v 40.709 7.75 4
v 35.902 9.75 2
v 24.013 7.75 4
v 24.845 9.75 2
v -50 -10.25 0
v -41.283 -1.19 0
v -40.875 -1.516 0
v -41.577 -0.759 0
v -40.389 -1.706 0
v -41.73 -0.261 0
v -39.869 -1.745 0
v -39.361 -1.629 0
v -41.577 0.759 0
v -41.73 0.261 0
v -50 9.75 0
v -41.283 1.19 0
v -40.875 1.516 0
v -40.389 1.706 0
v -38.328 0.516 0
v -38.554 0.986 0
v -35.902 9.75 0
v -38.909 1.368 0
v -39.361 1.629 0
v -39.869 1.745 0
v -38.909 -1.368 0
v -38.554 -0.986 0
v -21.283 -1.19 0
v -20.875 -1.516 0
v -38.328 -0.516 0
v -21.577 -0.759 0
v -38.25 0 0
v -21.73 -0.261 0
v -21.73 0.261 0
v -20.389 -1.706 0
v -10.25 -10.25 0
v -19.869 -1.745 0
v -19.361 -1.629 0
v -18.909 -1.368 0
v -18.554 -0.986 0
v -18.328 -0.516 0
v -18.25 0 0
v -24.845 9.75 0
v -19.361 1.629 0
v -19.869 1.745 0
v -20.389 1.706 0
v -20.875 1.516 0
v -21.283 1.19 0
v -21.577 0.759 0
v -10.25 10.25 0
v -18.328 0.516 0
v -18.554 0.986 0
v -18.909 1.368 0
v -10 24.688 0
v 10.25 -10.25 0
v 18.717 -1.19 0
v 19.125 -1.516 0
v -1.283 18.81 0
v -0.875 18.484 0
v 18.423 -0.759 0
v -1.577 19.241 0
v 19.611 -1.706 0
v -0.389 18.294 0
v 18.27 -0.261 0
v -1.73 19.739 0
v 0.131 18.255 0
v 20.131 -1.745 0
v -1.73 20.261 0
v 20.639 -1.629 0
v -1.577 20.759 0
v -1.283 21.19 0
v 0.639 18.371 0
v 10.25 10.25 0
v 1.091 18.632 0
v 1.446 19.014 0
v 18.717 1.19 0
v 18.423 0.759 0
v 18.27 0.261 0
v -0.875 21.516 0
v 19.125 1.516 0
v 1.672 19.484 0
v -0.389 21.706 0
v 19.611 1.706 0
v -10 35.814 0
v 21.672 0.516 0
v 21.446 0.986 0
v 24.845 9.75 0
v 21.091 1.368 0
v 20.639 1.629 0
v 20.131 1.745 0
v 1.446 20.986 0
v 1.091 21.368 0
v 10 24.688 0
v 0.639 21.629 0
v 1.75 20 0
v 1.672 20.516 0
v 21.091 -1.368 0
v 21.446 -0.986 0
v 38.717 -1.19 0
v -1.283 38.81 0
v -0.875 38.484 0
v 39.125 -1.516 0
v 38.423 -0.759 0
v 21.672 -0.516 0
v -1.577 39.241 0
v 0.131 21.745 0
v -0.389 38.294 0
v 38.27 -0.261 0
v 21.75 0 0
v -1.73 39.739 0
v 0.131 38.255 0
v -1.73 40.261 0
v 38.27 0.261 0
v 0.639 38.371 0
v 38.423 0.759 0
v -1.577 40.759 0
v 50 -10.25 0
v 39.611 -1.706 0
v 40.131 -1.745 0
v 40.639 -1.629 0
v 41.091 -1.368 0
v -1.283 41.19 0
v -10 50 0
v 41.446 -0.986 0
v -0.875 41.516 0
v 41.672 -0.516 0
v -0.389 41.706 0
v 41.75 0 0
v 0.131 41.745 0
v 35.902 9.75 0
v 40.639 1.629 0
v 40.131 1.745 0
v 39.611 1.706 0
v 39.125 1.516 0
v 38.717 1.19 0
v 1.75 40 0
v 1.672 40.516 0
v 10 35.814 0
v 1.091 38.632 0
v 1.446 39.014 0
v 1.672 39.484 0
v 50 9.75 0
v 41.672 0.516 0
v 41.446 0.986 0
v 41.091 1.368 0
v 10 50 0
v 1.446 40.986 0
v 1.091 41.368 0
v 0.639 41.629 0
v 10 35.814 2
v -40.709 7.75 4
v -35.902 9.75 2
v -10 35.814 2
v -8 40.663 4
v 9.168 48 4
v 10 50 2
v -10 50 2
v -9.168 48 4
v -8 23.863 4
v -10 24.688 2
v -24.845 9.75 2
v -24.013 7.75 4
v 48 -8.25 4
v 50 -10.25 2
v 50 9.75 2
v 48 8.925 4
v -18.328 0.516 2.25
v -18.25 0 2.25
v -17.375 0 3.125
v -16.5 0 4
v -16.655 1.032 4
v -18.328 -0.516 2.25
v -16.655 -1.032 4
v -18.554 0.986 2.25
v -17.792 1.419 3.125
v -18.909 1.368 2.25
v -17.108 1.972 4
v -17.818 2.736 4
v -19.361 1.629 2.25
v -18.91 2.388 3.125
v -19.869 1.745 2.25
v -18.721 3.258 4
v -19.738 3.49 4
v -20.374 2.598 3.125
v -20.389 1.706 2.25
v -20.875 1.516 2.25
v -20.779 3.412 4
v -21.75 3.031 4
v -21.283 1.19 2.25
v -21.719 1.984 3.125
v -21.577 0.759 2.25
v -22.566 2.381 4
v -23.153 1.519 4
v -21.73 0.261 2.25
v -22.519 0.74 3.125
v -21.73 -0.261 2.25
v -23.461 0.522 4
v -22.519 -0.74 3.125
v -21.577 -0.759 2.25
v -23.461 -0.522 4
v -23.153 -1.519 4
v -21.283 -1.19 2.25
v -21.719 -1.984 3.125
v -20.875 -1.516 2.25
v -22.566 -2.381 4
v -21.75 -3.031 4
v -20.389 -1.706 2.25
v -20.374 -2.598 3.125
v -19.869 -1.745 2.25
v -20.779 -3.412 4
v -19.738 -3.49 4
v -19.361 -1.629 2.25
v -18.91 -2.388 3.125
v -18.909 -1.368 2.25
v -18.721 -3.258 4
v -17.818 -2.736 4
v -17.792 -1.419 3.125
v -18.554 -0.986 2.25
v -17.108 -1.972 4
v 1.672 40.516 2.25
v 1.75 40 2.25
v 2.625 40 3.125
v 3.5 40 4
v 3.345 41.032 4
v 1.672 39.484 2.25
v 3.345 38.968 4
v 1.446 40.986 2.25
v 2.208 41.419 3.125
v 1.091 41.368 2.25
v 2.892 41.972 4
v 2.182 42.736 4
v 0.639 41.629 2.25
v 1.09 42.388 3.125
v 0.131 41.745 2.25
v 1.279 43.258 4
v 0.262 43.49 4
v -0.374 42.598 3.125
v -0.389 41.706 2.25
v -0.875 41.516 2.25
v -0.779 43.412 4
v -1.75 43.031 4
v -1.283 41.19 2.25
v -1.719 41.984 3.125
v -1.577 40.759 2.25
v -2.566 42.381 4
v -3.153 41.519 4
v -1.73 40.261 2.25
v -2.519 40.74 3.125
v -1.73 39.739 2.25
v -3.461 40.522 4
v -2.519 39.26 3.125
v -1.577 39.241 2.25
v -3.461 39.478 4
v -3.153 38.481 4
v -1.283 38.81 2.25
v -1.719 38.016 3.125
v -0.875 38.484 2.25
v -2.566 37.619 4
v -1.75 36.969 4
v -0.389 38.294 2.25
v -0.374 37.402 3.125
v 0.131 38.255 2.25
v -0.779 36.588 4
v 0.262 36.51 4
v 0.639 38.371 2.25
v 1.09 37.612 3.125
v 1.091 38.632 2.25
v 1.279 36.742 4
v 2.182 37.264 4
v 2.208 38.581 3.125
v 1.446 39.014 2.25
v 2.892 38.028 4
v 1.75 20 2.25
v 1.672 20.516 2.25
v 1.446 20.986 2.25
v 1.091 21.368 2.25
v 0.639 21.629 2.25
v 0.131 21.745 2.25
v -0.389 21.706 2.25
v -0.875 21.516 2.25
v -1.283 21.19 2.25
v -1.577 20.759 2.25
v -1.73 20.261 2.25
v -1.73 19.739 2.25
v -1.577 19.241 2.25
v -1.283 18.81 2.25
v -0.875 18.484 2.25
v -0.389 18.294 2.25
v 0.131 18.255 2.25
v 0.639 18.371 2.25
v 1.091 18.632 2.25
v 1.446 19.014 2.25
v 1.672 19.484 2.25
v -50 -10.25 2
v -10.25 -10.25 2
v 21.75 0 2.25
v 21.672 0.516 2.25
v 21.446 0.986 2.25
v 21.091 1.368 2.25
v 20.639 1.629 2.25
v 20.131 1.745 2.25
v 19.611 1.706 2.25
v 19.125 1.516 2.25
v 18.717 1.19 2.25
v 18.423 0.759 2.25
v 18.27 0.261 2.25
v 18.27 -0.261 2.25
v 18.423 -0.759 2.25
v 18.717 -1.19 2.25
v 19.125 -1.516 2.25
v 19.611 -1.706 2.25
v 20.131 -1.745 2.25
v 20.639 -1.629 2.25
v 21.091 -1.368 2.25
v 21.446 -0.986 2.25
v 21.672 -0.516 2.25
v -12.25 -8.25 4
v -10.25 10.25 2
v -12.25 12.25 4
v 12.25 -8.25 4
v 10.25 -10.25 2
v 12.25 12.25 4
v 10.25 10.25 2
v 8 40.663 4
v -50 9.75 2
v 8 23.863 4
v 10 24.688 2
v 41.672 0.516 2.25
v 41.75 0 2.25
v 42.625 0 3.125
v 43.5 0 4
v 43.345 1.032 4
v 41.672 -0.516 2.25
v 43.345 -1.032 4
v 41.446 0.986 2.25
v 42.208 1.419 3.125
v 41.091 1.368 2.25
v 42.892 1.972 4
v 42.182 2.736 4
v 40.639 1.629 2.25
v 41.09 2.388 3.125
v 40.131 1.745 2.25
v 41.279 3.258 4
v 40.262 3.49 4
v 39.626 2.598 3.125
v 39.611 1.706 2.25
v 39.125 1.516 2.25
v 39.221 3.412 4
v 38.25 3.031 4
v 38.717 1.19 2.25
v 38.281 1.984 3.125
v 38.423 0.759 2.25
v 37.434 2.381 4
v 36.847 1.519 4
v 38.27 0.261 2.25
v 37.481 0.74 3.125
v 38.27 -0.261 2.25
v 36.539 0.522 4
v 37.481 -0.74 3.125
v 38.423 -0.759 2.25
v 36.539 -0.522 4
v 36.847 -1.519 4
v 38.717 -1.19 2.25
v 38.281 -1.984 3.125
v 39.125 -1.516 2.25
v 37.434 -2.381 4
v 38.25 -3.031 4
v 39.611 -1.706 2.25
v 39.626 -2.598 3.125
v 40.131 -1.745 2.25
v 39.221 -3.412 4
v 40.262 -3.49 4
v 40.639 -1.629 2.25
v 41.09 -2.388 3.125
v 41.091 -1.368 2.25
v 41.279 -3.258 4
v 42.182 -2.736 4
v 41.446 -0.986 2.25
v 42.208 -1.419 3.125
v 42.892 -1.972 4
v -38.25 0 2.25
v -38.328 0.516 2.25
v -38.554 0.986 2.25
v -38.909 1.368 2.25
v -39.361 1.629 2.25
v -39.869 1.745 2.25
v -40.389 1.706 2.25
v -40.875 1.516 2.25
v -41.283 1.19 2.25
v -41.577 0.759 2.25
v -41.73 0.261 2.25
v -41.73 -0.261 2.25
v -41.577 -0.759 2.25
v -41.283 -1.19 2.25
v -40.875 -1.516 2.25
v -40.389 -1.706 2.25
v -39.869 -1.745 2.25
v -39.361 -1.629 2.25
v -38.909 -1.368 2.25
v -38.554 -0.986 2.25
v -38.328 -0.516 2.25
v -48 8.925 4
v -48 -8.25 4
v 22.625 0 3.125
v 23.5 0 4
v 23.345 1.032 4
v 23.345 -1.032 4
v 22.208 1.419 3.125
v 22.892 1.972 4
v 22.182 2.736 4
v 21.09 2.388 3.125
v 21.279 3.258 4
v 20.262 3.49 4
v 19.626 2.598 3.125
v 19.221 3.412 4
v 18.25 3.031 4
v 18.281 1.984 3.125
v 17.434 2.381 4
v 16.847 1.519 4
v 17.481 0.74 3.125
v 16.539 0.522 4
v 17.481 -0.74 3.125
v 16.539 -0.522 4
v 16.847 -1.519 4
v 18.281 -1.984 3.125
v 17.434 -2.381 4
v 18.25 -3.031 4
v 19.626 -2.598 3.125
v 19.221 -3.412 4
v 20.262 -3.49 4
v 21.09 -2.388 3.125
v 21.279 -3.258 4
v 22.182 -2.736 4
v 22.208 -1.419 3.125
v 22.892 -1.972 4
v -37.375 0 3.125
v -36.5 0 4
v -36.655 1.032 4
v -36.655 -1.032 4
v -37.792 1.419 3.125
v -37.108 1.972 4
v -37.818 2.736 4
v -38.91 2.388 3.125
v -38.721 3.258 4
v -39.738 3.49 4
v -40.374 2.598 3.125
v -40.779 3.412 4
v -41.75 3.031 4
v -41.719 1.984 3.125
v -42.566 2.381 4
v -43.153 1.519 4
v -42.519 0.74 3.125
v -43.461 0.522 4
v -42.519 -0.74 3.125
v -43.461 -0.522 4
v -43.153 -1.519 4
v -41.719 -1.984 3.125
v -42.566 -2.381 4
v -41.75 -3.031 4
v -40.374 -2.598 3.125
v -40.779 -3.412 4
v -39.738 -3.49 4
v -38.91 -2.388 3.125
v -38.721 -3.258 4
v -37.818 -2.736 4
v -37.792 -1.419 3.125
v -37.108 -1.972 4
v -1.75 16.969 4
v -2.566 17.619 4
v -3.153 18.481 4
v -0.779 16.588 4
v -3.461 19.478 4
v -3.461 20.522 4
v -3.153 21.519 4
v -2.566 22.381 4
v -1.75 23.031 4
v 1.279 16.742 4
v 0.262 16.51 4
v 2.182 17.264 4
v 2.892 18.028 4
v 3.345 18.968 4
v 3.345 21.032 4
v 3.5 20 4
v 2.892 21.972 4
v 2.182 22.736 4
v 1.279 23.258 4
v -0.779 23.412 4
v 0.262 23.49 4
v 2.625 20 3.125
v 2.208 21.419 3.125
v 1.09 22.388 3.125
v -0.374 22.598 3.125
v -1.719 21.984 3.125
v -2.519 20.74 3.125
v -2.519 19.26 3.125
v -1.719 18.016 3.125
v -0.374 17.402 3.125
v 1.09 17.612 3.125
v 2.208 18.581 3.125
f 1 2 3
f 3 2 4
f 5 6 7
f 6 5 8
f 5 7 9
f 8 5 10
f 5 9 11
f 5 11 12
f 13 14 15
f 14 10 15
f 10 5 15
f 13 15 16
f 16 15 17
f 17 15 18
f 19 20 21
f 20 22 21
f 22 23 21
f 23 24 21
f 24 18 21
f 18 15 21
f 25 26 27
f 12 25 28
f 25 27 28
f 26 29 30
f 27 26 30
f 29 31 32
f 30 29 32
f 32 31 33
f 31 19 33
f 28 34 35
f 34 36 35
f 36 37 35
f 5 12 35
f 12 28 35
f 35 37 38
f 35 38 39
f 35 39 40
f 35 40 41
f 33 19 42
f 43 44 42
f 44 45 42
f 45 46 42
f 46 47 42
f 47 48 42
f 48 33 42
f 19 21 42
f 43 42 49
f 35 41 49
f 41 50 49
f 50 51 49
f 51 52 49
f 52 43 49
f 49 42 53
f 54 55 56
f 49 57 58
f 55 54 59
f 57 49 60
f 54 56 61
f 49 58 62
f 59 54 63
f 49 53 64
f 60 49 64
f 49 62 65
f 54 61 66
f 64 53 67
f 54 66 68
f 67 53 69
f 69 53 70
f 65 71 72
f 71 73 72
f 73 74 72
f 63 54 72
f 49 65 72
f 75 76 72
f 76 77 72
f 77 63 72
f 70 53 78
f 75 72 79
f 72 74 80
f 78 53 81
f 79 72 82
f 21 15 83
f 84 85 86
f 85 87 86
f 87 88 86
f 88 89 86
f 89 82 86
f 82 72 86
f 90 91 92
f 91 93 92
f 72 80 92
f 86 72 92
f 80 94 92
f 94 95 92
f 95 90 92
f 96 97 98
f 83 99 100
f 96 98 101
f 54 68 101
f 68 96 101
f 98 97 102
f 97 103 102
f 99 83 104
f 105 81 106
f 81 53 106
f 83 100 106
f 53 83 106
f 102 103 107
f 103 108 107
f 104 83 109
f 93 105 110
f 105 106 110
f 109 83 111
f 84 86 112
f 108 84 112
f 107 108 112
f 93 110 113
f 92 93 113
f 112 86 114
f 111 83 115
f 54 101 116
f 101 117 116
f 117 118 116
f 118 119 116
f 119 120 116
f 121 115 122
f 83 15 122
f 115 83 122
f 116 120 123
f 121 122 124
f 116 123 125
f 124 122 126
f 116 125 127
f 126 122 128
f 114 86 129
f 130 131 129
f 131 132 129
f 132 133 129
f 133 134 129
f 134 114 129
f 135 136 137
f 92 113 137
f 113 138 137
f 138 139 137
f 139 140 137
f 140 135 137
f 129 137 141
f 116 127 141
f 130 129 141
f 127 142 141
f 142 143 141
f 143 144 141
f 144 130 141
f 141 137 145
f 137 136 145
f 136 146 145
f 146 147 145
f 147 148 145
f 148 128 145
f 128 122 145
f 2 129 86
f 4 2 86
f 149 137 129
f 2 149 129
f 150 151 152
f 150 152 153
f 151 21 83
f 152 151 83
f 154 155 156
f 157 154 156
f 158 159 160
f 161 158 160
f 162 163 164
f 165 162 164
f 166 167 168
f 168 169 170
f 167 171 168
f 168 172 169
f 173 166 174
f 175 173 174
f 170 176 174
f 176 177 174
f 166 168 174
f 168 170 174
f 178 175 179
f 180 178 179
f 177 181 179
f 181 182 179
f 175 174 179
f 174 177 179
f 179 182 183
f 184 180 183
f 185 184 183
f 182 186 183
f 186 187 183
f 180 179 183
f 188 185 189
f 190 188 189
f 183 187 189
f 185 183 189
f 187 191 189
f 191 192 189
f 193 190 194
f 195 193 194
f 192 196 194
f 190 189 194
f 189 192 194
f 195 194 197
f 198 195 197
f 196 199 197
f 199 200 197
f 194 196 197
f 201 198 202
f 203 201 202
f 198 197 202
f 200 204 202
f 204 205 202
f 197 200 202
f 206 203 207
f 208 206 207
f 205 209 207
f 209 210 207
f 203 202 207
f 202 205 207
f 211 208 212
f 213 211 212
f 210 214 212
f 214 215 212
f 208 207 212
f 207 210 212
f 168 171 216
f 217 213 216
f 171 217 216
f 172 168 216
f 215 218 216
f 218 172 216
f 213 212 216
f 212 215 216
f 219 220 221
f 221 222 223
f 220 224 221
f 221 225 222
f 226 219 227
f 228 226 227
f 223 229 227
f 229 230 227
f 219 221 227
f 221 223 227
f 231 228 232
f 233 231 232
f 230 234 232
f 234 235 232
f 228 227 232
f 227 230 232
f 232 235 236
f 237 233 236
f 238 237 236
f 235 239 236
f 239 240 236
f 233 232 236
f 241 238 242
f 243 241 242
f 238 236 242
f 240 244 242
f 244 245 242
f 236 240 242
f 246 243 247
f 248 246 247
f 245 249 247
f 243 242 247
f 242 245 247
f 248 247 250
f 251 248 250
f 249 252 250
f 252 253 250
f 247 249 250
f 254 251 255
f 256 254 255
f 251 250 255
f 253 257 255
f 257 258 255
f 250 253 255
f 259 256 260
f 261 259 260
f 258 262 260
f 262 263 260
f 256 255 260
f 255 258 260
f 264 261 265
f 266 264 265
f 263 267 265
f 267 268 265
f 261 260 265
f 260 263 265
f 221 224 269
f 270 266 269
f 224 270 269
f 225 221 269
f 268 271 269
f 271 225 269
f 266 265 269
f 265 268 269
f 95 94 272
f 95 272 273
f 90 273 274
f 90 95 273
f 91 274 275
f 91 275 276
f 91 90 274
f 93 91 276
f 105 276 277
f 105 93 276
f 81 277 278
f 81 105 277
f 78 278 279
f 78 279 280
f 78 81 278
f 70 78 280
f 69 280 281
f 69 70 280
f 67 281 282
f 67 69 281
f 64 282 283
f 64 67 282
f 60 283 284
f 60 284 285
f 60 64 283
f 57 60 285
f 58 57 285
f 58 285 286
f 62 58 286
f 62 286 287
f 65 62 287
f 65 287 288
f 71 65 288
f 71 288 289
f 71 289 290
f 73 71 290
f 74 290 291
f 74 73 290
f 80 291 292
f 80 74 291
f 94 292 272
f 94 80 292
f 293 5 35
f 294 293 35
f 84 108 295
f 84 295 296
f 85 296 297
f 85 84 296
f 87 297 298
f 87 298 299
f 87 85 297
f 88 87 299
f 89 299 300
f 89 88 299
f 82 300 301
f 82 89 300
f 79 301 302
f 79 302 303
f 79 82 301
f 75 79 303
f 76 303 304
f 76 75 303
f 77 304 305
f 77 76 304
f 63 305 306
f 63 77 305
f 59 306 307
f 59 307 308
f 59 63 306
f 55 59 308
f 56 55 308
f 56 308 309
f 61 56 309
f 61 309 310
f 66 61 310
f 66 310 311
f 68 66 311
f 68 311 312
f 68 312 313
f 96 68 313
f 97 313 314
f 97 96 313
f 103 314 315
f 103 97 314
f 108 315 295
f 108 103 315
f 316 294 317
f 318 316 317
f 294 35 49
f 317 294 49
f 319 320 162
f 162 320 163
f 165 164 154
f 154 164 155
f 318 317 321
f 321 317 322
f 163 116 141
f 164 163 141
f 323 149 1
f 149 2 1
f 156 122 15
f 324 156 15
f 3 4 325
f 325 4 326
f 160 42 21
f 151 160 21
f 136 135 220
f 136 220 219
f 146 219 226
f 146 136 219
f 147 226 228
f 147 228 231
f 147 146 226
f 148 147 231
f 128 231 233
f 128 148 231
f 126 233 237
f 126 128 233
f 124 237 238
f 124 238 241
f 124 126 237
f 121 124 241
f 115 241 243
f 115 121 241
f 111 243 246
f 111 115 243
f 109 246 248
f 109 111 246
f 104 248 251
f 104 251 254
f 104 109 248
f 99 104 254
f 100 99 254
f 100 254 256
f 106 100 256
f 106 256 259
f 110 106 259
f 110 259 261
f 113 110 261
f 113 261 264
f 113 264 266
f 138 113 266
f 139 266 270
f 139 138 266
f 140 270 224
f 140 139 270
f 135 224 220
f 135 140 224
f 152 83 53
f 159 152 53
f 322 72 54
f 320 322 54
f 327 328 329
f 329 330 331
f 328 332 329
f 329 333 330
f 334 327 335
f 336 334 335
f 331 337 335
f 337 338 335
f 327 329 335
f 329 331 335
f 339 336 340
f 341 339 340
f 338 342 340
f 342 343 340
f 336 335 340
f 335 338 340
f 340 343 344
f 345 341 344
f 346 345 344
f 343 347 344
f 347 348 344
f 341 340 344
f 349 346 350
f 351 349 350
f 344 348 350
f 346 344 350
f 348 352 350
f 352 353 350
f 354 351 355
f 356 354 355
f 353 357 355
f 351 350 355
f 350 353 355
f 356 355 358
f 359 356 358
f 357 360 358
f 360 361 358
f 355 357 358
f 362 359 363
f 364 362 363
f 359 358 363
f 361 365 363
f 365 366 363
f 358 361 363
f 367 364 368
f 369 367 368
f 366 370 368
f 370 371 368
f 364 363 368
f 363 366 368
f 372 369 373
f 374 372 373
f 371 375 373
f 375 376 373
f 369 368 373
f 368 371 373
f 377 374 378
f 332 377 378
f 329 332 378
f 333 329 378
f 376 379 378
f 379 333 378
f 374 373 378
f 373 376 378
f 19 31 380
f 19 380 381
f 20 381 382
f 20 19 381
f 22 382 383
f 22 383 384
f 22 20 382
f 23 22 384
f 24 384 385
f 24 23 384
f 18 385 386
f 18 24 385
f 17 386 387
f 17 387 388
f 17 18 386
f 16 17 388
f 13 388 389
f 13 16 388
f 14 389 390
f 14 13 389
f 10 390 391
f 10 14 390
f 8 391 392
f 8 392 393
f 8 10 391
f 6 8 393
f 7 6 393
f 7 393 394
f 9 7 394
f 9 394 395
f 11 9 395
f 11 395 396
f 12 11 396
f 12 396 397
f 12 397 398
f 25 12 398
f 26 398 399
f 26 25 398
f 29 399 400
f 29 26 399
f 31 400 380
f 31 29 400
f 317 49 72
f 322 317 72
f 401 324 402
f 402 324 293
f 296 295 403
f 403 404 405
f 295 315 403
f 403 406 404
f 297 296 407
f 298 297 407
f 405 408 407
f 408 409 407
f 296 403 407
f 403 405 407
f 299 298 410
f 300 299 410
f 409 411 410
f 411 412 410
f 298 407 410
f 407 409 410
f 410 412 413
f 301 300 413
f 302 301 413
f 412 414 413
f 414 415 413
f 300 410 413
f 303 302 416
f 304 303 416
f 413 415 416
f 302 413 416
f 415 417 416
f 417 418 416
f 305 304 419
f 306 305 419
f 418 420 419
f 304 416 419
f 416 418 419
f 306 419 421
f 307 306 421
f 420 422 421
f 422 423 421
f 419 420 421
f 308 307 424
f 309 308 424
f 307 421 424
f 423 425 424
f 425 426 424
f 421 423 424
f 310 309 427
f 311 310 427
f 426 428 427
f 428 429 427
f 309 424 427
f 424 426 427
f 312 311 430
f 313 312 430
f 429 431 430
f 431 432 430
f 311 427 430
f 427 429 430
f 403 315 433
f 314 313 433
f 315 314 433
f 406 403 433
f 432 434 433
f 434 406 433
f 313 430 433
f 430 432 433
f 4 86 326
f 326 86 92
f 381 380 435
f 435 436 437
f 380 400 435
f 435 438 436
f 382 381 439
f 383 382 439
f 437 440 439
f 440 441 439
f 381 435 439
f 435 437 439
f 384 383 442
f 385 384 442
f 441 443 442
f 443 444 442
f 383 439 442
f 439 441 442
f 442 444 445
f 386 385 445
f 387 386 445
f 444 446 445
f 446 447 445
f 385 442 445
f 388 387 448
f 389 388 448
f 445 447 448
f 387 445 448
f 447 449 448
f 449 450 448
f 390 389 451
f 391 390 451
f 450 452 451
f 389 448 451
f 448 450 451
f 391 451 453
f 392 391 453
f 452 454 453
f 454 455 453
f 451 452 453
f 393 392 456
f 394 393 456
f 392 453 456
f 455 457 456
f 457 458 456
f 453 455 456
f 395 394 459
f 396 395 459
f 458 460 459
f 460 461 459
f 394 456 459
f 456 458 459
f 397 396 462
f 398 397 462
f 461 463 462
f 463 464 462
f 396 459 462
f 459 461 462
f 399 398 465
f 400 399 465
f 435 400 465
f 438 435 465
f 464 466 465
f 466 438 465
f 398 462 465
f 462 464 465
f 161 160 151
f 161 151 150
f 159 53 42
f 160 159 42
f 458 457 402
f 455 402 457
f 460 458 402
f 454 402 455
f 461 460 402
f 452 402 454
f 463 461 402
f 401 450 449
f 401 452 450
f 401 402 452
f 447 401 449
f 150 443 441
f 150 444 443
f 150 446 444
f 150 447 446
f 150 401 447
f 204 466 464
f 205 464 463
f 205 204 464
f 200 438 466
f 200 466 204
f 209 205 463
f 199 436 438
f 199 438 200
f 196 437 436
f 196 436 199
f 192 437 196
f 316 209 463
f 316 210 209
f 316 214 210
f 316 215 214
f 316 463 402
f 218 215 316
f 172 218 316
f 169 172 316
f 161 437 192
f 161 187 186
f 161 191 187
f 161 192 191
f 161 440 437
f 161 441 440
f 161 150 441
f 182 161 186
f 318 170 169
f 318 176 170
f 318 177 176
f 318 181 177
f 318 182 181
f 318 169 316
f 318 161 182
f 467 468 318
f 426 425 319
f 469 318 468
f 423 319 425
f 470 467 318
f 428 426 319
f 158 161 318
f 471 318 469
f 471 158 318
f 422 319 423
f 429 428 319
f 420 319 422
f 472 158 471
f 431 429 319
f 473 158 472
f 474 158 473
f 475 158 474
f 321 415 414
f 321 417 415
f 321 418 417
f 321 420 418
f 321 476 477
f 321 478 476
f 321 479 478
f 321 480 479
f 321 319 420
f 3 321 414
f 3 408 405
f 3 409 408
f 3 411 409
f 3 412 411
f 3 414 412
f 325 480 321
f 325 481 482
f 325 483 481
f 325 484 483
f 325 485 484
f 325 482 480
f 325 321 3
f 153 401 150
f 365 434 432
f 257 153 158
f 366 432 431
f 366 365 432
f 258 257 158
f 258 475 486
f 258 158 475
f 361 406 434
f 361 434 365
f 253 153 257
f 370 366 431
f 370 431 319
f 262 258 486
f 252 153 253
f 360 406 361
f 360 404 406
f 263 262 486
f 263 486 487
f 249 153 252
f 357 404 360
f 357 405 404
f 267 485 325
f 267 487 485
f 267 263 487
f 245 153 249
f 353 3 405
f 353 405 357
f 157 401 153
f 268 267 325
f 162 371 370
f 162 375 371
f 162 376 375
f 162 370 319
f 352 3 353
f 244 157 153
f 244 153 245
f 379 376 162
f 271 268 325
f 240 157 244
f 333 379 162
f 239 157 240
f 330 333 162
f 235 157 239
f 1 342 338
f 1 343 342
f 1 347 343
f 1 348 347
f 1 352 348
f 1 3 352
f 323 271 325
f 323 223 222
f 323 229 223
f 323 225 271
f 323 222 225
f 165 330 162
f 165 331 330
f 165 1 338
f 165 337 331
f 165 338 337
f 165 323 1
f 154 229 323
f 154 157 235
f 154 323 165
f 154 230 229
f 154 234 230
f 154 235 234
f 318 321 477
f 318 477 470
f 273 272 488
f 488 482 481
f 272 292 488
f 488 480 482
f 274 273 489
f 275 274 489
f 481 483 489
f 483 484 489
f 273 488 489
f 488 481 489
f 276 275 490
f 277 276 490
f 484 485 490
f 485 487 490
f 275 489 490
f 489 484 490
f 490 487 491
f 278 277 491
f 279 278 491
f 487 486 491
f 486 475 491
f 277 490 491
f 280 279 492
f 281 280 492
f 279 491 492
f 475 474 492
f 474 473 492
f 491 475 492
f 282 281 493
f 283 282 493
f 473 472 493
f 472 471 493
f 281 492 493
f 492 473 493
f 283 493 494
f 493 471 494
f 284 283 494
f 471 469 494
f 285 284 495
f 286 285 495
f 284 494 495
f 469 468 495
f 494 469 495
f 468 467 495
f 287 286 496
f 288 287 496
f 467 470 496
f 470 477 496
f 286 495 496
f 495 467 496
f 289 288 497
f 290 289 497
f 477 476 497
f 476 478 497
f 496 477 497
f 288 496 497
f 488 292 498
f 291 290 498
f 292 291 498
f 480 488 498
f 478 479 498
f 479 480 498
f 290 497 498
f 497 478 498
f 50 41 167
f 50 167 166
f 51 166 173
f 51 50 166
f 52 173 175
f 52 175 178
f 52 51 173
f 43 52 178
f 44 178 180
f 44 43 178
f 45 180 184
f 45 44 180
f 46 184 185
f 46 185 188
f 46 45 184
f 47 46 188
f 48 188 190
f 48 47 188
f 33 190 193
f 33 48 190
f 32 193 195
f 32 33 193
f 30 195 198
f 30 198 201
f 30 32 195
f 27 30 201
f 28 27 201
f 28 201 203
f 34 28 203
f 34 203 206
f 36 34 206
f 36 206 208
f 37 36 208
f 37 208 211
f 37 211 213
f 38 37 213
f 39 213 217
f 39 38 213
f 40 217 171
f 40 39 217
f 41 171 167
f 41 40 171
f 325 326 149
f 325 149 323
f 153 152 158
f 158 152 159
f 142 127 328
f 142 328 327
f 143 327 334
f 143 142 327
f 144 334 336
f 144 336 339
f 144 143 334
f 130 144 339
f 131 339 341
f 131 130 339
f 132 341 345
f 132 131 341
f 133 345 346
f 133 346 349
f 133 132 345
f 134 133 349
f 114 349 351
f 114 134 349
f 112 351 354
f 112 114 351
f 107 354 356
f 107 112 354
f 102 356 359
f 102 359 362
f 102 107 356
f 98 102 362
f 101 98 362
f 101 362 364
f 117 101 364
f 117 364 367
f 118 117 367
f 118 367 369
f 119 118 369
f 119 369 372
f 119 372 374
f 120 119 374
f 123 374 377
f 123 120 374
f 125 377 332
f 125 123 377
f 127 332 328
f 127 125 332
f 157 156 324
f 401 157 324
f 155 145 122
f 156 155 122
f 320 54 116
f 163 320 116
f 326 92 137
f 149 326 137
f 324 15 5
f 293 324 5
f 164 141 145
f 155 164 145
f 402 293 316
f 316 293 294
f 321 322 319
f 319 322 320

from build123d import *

# Parameters (mm, degrees)
F0_R     = 1.75
F1_DEPTH = 4
F2_SIZE  = 1.75
F3_SIZE  = 2


with BuildPart() as f1:
    # F0 (on Top) → F1 (new body)
    with BuildSketch(Plane.XY):
        Polygon((10.25, 10.25), (10.25, -10.25), (50, -10.25), (50, 9.75), (10, 50), (0, 50), (-10, 50), (-50, 9.75), (-50, -10.25), (-10.25, -10.25), (-10.25, 10.25), (0, 10.25), align=None)
        with Locations((-40, 0)):
            Circle(F0_R, mode=Mode.SUBTRACT)
        with Locations((-20, 0)):
            Circle(F0_R, mode=Mode.SUBTRACT)
        with Locations((20, 0)):
            Circle(F0_R, mode=Mode.SUBTRACT)
        with Locations((40, 0)):
            Circle(F0_R, mode=Mode.SUBTRACT)
        Polygon((-35.901716, 9.75), (-10, 35.813601), (-10, 24.687961), (-24.845179, 9.75), align=None, mode=Mode.SUBTRACT)
        with Locations((0, 20)):
            Circle(F0_R, mode=Mode.SUBTRACT)
        Polygon((10, 24.687961), (10, 35.813601), (35.901716, 9.75), (24.845179, 9.75), align=None, mode=Mode.SUBTRACT)
        with Locations((0, 40)):
            Circle(F0_R, mode=Mode.SUBTRACT)
    extrude(amount=F1_DEPTH)

    # F2
    f2_edges = [f1.edges().sort_by_distance(p)[0] for p in [
        (-21.75, 0, 4),
        (-41.75, 0, 4),
        (-1.75, 20, 4),
        (-1.75, 40, 4),
        (18.25, 0, 4),
        (38.25, 0, 4),
    ]]
    chamfer(f2_edges, length=F2_SIZE)

    # F3
    f3_edges = [f1.edges().sort_by_distance(p)[0] for p in [
        (-30, 29.875, 4),
        (-50, -0.25, 4),
        (-30.125, -10.25, 4),
        (-10.25, 0, 4),
        (0, 10.25, 4),
        (10.25, 0, 4),
        (30.125, -10.25, 4),
        (50, -0.25, 4),
        (30, 29.875, 4),
        (0, 50, 4),
        (22.950858, 22.781801, 4),
        (10, 30.250781, 4),
        (17.422589, 17.218981, 4),
        (30.373447, 9.75, 4),
        (-17.422589, 17.218981, 4),
        (-30.373447, 9.75, 4),
        (-22.950858, 22.781801, 4),
        (-10, 30.250781, 4),
    ]]
    chamfer(f3_edges, length=F3_SIZE)


solid = f1.part
